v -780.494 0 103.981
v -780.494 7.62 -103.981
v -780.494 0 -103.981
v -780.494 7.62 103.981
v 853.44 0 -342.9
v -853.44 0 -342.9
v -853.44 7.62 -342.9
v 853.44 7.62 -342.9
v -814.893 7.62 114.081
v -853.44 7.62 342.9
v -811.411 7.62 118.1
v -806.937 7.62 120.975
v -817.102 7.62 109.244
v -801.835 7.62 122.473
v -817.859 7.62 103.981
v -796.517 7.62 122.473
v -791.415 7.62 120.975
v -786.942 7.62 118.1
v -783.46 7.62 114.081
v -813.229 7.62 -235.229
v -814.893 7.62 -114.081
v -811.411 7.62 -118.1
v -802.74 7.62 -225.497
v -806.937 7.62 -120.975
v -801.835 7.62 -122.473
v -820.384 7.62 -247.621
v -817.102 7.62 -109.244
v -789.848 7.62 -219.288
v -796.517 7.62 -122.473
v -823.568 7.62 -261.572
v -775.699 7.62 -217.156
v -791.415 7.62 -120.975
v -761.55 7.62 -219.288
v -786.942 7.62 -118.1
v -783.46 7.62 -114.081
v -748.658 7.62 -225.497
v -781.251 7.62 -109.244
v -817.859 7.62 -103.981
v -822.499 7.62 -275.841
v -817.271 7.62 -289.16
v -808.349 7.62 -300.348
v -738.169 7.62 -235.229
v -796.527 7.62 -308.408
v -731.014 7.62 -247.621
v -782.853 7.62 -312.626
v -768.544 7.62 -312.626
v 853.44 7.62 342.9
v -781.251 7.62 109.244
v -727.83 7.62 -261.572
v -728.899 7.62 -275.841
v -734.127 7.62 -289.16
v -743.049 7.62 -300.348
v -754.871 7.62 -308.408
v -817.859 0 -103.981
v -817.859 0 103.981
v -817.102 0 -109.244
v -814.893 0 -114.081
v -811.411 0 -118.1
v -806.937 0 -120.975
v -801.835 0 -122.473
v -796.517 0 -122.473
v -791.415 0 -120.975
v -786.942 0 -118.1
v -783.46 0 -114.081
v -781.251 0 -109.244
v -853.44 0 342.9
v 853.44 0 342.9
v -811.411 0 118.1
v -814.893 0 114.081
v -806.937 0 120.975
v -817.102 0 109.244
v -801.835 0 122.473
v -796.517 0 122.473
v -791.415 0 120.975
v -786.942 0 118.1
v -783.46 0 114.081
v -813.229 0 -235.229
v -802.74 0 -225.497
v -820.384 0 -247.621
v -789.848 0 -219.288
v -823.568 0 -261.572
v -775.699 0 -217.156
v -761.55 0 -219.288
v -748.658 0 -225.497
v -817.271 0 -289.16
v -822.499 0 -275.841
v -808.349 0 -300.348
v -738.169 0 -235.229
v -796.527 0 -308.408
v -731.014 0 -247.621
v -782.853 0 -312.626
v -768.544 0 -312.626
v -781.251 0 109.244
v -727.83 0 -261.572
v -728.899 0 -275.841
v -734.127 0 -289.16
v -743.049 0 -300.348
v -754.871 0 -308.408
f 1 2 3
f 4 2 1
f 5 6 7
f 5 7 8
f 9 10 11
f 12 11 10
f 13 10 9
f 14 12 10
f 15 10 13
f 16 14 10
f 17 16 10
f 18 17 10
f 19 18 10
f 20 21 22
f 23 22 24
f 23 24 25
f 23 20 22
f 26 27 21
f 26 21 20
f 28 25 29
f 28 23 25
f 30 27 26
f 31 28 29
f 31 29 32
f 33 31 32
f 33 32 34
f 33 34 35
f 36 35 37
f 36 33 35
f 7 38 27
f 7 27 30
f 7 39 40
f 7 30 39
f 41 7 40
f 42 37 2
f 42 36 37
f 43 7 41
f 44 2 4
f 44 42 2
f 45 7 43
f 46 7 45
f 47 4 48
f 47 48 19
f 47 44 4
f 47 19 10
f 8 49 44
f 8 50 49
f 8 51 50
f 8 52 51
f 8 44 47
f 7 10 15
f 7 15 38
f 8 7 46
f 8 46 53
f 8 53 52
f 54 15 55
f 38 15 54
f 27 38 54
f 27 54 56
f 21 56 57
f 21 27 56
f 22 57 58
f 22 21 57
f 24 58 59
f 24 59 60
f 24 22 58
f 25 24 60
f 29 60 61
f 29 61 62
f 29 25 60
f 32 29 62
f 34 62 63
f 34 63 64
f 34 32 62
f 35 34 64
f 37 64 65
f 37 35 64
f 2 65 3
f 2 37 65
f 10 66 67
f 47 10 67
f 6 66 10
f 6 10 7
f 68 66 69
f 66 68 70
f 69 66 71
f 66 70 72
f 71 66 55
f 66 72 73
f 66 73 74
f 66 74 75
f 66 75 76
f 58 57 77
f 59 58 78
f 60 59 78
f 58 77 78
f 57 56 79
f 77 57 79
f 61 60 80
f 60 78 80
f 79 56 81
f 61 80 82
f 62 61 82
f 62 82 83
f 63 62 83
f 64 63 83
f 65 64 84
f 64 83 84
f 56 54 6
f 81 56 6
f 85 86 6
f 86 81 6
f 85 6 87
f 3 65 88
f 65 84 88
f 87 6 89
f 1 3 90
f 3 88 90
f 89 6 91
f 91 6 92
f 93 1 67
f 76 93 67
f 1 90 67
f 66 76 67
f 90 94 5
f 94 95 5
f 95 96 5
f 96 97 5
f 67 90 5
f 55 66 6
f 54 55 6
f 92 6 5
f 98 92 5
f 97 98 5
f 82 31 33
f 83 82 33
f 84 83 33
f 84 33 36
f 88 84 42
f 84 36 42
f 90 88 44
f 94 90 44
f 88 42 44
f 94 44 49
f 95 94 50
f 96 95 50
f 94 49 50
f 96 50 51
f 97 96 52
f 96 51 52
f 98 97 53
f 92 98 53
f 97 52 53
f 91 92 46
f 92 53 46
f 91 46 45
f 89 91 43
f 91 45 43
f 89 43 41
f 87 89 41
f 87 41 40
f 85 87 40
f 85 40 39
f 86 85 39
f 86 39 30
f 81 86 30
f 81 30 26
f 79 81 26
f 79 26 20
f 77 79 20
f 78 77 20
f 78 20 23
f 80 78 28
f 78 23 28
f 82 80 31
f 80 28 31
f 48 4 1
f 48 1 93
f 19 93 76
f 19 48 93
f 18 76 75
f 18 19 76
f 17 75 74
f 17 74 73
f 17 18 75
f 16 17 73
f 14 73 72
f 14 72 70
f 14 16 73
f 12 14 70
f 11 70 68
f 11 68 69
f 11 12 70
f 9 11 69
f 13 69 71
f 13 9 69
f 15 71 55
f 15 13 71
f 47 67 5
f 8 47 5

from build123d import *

# Parameters (mm, degrees)
SKETCH1_W           = 1706.88
SKETCH1_H           = 685.8
BOSS_EXTRUDE1_DEPTH = 7.62
SKETCH2_R           = 48.003123946
CUT_EXTRUDE1_DEPTH  = 7.62


with BuildPart() as part:
    # Sketch1 → Boss-Extrude1 (new body)
    with BuildSketch(Plane(origin=(0, 0, 0), x_dir=(1, 0, 0), z_dir=(0, 1, 0))):
        Rectangle(SKETCH1_W, SKETCH1_H)
    extrude(amount=BOSS_EXTRUDE1_DEPTH)

    # Sketch2 → Cut-Extrude1 (cut)
    with BuildSketch(Plane(origin=(0, 7.62, 0), x_dir=(1, 0, 0), z_dir=(0, 1, 0))):
        with Locations(Location((-775.698925032, 265.158925032, 0), (0, 0, 270))):
            Circle(SKETCH2_R)
        with BuildLine():
            Line((-780.493781084, 103.980830335), (-780.493781084, -103.980830335))
            ThreePointArc((-780.493781084, -103.980830335), (-799.17629755, -122.663346801), (-817.858814016, -103.980830335))
            Line((-817.858814016, -103.980830335), (-817.858814016, 103.980830335))
            ThreePointArc((-817.858814016, 103.980830335), (-799.17629755, 122.663346801), (-780.493781084, 103.980830335))
        make_face()
    extrude(amount=-CUT_EXTRUDE1_DEPTH, mode=Mode.SUBTRACT)


solid = part.part
